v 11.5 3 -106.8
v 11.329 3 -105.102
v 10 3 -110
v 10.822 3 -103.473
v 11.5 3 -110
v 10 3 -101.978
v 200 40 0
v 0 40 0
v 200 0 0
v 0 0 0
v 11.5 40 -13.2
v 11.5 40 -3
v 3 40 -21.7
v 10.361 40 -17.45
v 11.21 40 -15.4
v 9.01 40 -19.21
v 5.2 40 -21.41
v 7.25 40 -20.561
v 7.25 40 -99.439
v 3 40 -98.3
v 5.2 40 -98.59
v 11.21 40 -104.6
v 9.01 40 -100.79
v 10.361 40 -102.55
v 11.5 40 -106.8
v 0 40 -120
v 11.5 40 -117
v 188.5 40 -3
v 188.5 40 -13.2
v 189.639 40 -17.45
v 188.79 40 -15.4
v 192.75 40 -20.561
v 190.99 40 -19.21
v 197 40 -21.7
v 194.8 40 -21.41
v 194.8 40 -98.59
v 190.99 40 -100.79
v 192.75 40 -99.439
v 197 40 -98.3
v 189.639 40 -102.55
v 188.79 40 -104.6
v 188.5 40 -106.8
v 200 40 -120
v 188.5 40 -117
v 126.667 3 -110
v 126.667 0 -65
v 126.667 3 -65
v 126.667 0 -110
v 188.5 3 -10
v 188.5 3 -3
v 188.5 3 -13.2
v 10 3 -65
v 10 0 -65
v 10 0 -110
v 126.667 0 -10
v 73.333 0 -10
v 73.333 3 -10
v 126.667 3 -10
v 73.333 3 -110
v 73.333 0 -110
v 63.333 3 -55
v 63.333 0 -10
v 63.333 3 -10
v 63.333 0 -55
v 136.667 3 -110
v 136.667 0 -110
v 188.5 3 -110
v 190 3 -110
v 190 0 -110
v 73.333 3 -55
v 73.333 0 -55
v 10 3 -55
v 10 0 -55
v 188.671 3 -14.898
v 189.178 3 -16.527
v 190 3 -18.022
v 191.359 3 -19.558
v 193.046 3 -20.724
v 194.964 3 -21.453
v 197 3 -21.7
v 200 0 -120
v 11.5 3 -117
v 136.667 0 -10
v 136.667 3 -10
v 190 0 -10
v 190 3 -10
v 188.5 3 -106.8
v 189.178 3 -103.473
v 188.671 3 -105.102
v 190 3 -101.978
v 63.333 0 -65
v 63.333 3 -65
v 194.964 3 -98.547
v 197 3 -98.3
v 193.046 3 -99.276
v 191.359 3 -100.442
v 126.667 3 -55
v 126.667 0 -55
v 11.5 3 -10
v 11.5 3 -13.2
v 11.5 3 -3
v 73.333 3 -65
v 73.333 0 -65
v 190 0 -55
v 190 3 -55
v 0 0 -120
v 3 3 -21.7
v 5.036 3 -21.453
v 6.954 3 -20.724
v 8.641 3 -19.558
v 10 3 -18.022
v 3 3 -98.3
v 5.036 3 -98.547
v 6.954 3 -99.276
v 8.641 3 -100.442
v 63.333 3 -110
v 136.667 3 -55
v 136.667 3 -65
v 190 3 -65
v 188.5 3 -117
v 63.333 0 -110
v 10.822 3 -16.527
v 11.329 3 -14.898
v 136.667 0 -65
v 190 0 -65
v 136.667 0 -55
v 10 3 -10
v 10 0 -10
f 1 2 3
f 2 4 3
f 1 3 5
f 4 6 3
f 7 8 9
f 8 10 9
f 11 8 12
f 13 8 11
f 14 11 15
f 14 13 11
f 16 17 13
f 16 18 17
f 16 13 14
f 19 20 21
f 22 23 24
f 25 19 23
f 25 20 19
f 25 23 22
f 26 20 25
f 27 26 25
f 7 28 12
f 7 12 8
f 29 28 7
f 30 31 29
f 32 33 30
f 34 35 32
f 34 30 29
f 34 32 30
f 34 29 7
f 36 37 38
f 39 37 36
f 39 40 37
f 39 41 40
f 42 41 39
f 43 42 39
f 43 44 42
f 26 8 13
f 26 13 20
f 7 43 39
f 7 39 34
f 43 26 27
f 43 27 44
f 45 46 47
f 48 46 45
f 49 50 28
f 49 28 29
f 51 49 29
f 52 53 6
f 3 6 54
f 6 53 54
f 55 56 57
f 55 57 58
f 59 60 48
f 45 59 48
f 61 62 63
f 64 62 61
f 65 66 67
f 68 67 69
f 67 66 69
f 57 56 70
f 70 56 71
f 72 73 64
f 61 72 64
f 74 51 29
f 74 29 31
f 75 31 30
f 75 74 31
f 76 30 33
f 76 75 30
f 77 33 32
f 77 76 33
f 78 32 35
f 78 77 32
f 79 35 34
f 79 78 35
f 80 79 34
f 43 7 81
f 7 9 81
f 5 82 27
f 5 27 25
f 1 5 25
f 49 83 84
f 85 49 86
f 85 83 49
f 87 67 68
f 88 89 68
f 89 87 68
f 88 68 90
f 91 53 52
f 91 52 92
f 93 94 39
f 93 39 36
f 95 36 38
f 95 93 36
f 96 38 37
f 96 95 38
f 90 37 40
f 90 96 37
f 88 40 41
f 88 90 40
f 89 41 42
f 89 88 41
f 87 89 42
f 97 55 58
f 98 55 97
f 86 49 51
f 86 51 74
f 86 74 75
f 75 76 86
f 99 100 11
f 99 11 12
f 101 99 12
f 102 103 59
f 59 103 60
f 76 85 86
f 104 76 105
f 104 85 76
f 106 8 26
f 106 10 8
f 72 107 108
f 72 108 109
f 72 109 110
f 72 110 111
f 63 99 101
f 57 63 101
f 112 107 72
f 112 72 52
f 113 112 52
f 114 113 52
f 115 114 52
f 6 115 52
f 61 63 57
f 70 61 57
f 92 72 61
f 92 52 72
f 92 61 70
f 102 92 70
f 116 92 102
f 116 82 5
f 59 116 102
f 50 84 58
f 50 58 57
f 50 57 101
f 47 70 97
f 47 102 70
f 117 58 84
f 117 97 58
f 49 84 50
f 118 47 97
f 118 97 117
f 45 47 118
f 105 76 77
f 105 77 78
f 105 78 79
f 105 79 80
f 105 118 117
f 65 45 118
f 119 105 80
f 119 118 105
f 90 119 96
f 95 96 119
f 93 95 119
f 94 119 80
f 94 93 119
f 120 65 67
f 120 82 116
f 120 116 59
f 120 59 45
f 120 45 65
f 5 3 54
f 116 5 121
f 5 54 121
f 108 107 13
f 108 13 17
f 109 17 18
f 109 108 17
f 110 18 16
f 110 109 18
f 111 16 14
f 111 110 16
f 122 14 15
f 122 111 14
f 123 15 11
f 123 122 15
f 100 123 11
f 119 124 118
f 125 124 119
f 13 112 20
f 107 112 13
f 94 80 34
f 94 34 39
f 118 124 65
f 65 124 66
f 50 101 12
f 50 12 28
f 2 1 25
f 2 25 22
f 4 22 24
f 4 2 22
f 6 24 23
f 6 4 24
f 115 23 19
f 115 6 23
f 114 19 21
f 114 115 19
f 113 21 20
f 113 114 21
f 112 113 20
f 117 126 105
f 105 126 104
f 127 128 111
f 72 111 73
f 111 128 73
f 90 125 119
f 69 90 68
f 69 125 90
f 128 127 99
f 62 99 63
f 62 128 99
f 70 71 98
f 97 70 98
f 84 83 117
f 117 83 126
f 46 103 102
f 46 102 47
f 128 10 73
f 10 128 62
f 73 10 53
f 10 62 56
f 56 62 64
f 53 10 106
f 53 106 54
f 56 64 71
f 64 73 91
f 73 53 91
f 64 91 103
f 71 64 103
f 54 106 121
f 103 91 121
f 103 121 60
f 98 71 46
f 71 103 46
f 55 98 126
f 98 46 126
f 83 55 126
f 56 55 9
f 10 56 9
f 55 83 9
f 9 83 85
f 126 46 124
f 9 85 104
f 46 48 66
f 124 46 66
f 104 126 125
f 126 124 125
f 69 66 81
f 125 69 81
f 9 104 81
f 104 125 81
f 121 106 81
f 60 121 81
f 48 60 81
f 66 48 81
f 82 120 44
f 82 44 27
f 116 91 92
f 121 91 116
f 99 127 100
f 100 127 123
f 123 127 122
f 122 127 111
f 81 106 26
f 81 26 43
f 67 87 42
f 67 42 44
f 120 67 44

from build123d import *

# Parameters (mm, degrees)
SKETCH1_W           = 200
SKETCH1_H           = 120
SKETCH1_W_2         = 53.333333333
SKETCH1_H_2         = 45
SKETCH1_W_3         = 53.333333334
BOSS_EXTRUDE1_DEPTH = 3
SKETCH2_W           = 200
SKETCH2_H           = 120
BOSS_EXTRUDE2_DEPTH = 37


with BuildPart() as part:
    # Sketch1 → Boss-Extrude1 (new body)
    with BuildSketch(Plane(origin=(0, 0, 0), x_dir=(1, 0, 0), z_dir=(0, 1, 0))):
        with Locations((100, 60)):
            Rectangle(SKETCH1_W, SKETCH1_H)
        with Locations((36.666666667, 87.5)):
            Rectangle(SKETCH1_W_2, SKETCH1_H_2, mode=Mode.SUBTRACT)
        with Locations((36.666666667, 32.5)):
            Rectangle(SKETCH1_W_2, SKETCH1_H_2, mode=Mode.SUBTRACT)
        with Locations((100, 87.5)):
            Rectangle(SKETCH1_W_3, SKETCH1_H_2, mode=Mode.SUBTRACT)
        with Locations((163.333333334, 87.5)):
            Rectangle(SKETCH1_W_2, SKETCH1_H_2, mode=Mode.SUBTRACT)
        with Locations((163.333333334, 32.5)):
            Rectangle(SKETCH1_W_2, SKETCH1_H_2, mode=Mode.SUBTRACT)
        with Locations((100, 32.5)):
            Rectangle(SKETCH1_W_3, SKETCH1_H_2, mode=Mode.SUBTRACT)
    extrude(amount=BOSS_EXTRUDE1_DEPTH)

    # Sketch2 → Boss-Extrude2 (add)
    with BuildSketch(Plane(origin=(0, 3, 0), x_dir=(1, 0, 0), z_dir=(0, 1, 0))):
        with Locations((100, 60)):
            Rectangle(SKETCH2_W, SKETCH2_H)
        with BuildLine():
            Line((3, 98.3), (3, 21.7))
            ThreePointArc((3, 21.7), (9.01040764, 19.21040764), (11.5, 13.2))
            Line((11.5, 13.2), (11.5, 3))
            Line((11.5, 3), (188.5, 3))
            Line((188.5, 3), (188.5, 13.2))
            ThreePointArc((188.5, 13.2), (190.98959236, 19.21040764), (197, 21.7))
            Line((197, 21.7), (197, 98.3))
            ThreePointArc((197, 98.3), (190.98959236, 100.78959236), (188.5, 106.8))
            Line((188.5, 106.8), (188.5, 117))
            Line((188.5, 117), (11.5, 117))
            Line((11.5, 117), (11.5, 106.8))
            ThreePointArc((11.5, 106.8), (9.01040764, 100.78959236), (3, 98.3))
        make_face(mode=Mode.SUBTRACT)
    extrude(amount=BOSS_EXTRUDE2_DEPTH)


solid = part.part
